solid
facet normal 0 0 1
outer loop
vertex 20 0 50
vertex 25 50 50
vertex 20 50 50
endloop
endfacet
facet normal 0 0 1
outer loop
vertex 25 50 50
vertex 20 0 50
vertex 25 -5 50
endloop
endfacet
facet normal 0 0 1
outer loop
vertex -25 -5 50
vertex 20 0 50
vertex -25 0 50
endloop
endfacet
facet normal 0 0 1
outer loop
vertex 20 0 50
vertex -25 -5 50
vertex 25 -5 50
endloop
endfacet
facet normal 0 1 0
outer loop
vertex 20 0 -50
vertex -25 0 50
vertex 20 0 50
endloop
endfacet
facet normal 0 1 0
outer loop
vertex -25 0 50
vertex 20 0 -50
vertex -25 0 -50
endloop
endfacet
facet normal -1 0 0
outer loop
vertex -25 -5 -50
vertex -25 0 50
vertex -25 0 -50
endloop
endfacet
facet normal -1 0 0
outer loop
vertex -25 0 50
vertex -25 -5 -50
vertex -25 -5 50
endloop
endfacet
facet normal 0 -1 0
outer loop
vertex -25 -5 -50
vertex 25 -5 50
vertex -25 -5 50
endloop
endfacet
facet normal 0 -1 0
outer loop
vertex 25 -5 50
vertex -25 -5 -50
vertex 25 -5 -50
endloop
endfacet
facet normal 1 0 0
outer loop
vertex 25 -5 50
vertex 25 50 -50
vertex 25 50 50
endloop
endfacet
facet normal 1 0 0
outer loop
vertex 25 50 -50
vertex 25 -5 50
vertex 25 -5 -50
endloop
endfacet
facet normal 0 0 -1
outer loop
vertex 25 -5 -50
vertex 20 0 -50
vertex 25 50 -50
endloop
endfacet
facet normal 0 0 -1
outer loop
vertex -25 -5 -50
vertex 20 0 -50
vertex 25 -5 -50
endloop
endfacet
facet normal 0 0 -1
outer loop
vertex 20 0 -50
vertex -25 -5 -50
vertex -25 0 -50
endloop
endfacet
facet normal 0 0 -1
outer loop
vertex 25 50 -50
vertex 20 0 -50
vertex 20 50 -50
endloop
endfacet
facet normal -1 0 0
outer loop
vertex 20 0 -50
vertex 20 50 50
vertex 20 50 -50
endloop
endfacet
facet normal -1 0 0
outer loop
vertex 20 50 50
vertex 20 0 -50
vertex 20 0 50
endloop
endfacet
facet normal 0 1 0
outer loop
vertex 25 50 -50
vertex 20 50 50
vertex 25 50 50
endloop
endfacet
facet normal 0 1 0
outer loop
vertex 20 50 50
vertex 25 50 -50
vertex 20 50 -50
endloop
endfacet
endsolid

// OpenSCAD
// file: blank.scad
include <common.scad>

module Blank(front_thickness=5)
{
  color("red")
  {
    rotate([90, 0, 0])
    {
      linear_extrude(front_thickness)
      {
        FrontProjection();
      }
    }
  }
}

Blank();
// file: common.scad
segment_width = 50;
segment_height = 100;

module FrontProjection()
{
  /* TODO */
  square([segment_width, segment_height], center=true);
}
// main file
include <common.scad>
use <blank.scad>

module BlankWithMountingPlate(front_thickness=5, plate_thickness=5, plate_depth=50)
{
  Blank(front_thickness);

  color("green")
  {
    translate([(segment_width - plate_thickness) / 2, 0, 0])
    {
      rotate([-90, 0, 0])
      {
        linear_extrude(plate_depth)
        {
          square([plate_thickness, segment_height], center=true);
        }
      }
    }
  }
}

BlankWithMountingPlate();
